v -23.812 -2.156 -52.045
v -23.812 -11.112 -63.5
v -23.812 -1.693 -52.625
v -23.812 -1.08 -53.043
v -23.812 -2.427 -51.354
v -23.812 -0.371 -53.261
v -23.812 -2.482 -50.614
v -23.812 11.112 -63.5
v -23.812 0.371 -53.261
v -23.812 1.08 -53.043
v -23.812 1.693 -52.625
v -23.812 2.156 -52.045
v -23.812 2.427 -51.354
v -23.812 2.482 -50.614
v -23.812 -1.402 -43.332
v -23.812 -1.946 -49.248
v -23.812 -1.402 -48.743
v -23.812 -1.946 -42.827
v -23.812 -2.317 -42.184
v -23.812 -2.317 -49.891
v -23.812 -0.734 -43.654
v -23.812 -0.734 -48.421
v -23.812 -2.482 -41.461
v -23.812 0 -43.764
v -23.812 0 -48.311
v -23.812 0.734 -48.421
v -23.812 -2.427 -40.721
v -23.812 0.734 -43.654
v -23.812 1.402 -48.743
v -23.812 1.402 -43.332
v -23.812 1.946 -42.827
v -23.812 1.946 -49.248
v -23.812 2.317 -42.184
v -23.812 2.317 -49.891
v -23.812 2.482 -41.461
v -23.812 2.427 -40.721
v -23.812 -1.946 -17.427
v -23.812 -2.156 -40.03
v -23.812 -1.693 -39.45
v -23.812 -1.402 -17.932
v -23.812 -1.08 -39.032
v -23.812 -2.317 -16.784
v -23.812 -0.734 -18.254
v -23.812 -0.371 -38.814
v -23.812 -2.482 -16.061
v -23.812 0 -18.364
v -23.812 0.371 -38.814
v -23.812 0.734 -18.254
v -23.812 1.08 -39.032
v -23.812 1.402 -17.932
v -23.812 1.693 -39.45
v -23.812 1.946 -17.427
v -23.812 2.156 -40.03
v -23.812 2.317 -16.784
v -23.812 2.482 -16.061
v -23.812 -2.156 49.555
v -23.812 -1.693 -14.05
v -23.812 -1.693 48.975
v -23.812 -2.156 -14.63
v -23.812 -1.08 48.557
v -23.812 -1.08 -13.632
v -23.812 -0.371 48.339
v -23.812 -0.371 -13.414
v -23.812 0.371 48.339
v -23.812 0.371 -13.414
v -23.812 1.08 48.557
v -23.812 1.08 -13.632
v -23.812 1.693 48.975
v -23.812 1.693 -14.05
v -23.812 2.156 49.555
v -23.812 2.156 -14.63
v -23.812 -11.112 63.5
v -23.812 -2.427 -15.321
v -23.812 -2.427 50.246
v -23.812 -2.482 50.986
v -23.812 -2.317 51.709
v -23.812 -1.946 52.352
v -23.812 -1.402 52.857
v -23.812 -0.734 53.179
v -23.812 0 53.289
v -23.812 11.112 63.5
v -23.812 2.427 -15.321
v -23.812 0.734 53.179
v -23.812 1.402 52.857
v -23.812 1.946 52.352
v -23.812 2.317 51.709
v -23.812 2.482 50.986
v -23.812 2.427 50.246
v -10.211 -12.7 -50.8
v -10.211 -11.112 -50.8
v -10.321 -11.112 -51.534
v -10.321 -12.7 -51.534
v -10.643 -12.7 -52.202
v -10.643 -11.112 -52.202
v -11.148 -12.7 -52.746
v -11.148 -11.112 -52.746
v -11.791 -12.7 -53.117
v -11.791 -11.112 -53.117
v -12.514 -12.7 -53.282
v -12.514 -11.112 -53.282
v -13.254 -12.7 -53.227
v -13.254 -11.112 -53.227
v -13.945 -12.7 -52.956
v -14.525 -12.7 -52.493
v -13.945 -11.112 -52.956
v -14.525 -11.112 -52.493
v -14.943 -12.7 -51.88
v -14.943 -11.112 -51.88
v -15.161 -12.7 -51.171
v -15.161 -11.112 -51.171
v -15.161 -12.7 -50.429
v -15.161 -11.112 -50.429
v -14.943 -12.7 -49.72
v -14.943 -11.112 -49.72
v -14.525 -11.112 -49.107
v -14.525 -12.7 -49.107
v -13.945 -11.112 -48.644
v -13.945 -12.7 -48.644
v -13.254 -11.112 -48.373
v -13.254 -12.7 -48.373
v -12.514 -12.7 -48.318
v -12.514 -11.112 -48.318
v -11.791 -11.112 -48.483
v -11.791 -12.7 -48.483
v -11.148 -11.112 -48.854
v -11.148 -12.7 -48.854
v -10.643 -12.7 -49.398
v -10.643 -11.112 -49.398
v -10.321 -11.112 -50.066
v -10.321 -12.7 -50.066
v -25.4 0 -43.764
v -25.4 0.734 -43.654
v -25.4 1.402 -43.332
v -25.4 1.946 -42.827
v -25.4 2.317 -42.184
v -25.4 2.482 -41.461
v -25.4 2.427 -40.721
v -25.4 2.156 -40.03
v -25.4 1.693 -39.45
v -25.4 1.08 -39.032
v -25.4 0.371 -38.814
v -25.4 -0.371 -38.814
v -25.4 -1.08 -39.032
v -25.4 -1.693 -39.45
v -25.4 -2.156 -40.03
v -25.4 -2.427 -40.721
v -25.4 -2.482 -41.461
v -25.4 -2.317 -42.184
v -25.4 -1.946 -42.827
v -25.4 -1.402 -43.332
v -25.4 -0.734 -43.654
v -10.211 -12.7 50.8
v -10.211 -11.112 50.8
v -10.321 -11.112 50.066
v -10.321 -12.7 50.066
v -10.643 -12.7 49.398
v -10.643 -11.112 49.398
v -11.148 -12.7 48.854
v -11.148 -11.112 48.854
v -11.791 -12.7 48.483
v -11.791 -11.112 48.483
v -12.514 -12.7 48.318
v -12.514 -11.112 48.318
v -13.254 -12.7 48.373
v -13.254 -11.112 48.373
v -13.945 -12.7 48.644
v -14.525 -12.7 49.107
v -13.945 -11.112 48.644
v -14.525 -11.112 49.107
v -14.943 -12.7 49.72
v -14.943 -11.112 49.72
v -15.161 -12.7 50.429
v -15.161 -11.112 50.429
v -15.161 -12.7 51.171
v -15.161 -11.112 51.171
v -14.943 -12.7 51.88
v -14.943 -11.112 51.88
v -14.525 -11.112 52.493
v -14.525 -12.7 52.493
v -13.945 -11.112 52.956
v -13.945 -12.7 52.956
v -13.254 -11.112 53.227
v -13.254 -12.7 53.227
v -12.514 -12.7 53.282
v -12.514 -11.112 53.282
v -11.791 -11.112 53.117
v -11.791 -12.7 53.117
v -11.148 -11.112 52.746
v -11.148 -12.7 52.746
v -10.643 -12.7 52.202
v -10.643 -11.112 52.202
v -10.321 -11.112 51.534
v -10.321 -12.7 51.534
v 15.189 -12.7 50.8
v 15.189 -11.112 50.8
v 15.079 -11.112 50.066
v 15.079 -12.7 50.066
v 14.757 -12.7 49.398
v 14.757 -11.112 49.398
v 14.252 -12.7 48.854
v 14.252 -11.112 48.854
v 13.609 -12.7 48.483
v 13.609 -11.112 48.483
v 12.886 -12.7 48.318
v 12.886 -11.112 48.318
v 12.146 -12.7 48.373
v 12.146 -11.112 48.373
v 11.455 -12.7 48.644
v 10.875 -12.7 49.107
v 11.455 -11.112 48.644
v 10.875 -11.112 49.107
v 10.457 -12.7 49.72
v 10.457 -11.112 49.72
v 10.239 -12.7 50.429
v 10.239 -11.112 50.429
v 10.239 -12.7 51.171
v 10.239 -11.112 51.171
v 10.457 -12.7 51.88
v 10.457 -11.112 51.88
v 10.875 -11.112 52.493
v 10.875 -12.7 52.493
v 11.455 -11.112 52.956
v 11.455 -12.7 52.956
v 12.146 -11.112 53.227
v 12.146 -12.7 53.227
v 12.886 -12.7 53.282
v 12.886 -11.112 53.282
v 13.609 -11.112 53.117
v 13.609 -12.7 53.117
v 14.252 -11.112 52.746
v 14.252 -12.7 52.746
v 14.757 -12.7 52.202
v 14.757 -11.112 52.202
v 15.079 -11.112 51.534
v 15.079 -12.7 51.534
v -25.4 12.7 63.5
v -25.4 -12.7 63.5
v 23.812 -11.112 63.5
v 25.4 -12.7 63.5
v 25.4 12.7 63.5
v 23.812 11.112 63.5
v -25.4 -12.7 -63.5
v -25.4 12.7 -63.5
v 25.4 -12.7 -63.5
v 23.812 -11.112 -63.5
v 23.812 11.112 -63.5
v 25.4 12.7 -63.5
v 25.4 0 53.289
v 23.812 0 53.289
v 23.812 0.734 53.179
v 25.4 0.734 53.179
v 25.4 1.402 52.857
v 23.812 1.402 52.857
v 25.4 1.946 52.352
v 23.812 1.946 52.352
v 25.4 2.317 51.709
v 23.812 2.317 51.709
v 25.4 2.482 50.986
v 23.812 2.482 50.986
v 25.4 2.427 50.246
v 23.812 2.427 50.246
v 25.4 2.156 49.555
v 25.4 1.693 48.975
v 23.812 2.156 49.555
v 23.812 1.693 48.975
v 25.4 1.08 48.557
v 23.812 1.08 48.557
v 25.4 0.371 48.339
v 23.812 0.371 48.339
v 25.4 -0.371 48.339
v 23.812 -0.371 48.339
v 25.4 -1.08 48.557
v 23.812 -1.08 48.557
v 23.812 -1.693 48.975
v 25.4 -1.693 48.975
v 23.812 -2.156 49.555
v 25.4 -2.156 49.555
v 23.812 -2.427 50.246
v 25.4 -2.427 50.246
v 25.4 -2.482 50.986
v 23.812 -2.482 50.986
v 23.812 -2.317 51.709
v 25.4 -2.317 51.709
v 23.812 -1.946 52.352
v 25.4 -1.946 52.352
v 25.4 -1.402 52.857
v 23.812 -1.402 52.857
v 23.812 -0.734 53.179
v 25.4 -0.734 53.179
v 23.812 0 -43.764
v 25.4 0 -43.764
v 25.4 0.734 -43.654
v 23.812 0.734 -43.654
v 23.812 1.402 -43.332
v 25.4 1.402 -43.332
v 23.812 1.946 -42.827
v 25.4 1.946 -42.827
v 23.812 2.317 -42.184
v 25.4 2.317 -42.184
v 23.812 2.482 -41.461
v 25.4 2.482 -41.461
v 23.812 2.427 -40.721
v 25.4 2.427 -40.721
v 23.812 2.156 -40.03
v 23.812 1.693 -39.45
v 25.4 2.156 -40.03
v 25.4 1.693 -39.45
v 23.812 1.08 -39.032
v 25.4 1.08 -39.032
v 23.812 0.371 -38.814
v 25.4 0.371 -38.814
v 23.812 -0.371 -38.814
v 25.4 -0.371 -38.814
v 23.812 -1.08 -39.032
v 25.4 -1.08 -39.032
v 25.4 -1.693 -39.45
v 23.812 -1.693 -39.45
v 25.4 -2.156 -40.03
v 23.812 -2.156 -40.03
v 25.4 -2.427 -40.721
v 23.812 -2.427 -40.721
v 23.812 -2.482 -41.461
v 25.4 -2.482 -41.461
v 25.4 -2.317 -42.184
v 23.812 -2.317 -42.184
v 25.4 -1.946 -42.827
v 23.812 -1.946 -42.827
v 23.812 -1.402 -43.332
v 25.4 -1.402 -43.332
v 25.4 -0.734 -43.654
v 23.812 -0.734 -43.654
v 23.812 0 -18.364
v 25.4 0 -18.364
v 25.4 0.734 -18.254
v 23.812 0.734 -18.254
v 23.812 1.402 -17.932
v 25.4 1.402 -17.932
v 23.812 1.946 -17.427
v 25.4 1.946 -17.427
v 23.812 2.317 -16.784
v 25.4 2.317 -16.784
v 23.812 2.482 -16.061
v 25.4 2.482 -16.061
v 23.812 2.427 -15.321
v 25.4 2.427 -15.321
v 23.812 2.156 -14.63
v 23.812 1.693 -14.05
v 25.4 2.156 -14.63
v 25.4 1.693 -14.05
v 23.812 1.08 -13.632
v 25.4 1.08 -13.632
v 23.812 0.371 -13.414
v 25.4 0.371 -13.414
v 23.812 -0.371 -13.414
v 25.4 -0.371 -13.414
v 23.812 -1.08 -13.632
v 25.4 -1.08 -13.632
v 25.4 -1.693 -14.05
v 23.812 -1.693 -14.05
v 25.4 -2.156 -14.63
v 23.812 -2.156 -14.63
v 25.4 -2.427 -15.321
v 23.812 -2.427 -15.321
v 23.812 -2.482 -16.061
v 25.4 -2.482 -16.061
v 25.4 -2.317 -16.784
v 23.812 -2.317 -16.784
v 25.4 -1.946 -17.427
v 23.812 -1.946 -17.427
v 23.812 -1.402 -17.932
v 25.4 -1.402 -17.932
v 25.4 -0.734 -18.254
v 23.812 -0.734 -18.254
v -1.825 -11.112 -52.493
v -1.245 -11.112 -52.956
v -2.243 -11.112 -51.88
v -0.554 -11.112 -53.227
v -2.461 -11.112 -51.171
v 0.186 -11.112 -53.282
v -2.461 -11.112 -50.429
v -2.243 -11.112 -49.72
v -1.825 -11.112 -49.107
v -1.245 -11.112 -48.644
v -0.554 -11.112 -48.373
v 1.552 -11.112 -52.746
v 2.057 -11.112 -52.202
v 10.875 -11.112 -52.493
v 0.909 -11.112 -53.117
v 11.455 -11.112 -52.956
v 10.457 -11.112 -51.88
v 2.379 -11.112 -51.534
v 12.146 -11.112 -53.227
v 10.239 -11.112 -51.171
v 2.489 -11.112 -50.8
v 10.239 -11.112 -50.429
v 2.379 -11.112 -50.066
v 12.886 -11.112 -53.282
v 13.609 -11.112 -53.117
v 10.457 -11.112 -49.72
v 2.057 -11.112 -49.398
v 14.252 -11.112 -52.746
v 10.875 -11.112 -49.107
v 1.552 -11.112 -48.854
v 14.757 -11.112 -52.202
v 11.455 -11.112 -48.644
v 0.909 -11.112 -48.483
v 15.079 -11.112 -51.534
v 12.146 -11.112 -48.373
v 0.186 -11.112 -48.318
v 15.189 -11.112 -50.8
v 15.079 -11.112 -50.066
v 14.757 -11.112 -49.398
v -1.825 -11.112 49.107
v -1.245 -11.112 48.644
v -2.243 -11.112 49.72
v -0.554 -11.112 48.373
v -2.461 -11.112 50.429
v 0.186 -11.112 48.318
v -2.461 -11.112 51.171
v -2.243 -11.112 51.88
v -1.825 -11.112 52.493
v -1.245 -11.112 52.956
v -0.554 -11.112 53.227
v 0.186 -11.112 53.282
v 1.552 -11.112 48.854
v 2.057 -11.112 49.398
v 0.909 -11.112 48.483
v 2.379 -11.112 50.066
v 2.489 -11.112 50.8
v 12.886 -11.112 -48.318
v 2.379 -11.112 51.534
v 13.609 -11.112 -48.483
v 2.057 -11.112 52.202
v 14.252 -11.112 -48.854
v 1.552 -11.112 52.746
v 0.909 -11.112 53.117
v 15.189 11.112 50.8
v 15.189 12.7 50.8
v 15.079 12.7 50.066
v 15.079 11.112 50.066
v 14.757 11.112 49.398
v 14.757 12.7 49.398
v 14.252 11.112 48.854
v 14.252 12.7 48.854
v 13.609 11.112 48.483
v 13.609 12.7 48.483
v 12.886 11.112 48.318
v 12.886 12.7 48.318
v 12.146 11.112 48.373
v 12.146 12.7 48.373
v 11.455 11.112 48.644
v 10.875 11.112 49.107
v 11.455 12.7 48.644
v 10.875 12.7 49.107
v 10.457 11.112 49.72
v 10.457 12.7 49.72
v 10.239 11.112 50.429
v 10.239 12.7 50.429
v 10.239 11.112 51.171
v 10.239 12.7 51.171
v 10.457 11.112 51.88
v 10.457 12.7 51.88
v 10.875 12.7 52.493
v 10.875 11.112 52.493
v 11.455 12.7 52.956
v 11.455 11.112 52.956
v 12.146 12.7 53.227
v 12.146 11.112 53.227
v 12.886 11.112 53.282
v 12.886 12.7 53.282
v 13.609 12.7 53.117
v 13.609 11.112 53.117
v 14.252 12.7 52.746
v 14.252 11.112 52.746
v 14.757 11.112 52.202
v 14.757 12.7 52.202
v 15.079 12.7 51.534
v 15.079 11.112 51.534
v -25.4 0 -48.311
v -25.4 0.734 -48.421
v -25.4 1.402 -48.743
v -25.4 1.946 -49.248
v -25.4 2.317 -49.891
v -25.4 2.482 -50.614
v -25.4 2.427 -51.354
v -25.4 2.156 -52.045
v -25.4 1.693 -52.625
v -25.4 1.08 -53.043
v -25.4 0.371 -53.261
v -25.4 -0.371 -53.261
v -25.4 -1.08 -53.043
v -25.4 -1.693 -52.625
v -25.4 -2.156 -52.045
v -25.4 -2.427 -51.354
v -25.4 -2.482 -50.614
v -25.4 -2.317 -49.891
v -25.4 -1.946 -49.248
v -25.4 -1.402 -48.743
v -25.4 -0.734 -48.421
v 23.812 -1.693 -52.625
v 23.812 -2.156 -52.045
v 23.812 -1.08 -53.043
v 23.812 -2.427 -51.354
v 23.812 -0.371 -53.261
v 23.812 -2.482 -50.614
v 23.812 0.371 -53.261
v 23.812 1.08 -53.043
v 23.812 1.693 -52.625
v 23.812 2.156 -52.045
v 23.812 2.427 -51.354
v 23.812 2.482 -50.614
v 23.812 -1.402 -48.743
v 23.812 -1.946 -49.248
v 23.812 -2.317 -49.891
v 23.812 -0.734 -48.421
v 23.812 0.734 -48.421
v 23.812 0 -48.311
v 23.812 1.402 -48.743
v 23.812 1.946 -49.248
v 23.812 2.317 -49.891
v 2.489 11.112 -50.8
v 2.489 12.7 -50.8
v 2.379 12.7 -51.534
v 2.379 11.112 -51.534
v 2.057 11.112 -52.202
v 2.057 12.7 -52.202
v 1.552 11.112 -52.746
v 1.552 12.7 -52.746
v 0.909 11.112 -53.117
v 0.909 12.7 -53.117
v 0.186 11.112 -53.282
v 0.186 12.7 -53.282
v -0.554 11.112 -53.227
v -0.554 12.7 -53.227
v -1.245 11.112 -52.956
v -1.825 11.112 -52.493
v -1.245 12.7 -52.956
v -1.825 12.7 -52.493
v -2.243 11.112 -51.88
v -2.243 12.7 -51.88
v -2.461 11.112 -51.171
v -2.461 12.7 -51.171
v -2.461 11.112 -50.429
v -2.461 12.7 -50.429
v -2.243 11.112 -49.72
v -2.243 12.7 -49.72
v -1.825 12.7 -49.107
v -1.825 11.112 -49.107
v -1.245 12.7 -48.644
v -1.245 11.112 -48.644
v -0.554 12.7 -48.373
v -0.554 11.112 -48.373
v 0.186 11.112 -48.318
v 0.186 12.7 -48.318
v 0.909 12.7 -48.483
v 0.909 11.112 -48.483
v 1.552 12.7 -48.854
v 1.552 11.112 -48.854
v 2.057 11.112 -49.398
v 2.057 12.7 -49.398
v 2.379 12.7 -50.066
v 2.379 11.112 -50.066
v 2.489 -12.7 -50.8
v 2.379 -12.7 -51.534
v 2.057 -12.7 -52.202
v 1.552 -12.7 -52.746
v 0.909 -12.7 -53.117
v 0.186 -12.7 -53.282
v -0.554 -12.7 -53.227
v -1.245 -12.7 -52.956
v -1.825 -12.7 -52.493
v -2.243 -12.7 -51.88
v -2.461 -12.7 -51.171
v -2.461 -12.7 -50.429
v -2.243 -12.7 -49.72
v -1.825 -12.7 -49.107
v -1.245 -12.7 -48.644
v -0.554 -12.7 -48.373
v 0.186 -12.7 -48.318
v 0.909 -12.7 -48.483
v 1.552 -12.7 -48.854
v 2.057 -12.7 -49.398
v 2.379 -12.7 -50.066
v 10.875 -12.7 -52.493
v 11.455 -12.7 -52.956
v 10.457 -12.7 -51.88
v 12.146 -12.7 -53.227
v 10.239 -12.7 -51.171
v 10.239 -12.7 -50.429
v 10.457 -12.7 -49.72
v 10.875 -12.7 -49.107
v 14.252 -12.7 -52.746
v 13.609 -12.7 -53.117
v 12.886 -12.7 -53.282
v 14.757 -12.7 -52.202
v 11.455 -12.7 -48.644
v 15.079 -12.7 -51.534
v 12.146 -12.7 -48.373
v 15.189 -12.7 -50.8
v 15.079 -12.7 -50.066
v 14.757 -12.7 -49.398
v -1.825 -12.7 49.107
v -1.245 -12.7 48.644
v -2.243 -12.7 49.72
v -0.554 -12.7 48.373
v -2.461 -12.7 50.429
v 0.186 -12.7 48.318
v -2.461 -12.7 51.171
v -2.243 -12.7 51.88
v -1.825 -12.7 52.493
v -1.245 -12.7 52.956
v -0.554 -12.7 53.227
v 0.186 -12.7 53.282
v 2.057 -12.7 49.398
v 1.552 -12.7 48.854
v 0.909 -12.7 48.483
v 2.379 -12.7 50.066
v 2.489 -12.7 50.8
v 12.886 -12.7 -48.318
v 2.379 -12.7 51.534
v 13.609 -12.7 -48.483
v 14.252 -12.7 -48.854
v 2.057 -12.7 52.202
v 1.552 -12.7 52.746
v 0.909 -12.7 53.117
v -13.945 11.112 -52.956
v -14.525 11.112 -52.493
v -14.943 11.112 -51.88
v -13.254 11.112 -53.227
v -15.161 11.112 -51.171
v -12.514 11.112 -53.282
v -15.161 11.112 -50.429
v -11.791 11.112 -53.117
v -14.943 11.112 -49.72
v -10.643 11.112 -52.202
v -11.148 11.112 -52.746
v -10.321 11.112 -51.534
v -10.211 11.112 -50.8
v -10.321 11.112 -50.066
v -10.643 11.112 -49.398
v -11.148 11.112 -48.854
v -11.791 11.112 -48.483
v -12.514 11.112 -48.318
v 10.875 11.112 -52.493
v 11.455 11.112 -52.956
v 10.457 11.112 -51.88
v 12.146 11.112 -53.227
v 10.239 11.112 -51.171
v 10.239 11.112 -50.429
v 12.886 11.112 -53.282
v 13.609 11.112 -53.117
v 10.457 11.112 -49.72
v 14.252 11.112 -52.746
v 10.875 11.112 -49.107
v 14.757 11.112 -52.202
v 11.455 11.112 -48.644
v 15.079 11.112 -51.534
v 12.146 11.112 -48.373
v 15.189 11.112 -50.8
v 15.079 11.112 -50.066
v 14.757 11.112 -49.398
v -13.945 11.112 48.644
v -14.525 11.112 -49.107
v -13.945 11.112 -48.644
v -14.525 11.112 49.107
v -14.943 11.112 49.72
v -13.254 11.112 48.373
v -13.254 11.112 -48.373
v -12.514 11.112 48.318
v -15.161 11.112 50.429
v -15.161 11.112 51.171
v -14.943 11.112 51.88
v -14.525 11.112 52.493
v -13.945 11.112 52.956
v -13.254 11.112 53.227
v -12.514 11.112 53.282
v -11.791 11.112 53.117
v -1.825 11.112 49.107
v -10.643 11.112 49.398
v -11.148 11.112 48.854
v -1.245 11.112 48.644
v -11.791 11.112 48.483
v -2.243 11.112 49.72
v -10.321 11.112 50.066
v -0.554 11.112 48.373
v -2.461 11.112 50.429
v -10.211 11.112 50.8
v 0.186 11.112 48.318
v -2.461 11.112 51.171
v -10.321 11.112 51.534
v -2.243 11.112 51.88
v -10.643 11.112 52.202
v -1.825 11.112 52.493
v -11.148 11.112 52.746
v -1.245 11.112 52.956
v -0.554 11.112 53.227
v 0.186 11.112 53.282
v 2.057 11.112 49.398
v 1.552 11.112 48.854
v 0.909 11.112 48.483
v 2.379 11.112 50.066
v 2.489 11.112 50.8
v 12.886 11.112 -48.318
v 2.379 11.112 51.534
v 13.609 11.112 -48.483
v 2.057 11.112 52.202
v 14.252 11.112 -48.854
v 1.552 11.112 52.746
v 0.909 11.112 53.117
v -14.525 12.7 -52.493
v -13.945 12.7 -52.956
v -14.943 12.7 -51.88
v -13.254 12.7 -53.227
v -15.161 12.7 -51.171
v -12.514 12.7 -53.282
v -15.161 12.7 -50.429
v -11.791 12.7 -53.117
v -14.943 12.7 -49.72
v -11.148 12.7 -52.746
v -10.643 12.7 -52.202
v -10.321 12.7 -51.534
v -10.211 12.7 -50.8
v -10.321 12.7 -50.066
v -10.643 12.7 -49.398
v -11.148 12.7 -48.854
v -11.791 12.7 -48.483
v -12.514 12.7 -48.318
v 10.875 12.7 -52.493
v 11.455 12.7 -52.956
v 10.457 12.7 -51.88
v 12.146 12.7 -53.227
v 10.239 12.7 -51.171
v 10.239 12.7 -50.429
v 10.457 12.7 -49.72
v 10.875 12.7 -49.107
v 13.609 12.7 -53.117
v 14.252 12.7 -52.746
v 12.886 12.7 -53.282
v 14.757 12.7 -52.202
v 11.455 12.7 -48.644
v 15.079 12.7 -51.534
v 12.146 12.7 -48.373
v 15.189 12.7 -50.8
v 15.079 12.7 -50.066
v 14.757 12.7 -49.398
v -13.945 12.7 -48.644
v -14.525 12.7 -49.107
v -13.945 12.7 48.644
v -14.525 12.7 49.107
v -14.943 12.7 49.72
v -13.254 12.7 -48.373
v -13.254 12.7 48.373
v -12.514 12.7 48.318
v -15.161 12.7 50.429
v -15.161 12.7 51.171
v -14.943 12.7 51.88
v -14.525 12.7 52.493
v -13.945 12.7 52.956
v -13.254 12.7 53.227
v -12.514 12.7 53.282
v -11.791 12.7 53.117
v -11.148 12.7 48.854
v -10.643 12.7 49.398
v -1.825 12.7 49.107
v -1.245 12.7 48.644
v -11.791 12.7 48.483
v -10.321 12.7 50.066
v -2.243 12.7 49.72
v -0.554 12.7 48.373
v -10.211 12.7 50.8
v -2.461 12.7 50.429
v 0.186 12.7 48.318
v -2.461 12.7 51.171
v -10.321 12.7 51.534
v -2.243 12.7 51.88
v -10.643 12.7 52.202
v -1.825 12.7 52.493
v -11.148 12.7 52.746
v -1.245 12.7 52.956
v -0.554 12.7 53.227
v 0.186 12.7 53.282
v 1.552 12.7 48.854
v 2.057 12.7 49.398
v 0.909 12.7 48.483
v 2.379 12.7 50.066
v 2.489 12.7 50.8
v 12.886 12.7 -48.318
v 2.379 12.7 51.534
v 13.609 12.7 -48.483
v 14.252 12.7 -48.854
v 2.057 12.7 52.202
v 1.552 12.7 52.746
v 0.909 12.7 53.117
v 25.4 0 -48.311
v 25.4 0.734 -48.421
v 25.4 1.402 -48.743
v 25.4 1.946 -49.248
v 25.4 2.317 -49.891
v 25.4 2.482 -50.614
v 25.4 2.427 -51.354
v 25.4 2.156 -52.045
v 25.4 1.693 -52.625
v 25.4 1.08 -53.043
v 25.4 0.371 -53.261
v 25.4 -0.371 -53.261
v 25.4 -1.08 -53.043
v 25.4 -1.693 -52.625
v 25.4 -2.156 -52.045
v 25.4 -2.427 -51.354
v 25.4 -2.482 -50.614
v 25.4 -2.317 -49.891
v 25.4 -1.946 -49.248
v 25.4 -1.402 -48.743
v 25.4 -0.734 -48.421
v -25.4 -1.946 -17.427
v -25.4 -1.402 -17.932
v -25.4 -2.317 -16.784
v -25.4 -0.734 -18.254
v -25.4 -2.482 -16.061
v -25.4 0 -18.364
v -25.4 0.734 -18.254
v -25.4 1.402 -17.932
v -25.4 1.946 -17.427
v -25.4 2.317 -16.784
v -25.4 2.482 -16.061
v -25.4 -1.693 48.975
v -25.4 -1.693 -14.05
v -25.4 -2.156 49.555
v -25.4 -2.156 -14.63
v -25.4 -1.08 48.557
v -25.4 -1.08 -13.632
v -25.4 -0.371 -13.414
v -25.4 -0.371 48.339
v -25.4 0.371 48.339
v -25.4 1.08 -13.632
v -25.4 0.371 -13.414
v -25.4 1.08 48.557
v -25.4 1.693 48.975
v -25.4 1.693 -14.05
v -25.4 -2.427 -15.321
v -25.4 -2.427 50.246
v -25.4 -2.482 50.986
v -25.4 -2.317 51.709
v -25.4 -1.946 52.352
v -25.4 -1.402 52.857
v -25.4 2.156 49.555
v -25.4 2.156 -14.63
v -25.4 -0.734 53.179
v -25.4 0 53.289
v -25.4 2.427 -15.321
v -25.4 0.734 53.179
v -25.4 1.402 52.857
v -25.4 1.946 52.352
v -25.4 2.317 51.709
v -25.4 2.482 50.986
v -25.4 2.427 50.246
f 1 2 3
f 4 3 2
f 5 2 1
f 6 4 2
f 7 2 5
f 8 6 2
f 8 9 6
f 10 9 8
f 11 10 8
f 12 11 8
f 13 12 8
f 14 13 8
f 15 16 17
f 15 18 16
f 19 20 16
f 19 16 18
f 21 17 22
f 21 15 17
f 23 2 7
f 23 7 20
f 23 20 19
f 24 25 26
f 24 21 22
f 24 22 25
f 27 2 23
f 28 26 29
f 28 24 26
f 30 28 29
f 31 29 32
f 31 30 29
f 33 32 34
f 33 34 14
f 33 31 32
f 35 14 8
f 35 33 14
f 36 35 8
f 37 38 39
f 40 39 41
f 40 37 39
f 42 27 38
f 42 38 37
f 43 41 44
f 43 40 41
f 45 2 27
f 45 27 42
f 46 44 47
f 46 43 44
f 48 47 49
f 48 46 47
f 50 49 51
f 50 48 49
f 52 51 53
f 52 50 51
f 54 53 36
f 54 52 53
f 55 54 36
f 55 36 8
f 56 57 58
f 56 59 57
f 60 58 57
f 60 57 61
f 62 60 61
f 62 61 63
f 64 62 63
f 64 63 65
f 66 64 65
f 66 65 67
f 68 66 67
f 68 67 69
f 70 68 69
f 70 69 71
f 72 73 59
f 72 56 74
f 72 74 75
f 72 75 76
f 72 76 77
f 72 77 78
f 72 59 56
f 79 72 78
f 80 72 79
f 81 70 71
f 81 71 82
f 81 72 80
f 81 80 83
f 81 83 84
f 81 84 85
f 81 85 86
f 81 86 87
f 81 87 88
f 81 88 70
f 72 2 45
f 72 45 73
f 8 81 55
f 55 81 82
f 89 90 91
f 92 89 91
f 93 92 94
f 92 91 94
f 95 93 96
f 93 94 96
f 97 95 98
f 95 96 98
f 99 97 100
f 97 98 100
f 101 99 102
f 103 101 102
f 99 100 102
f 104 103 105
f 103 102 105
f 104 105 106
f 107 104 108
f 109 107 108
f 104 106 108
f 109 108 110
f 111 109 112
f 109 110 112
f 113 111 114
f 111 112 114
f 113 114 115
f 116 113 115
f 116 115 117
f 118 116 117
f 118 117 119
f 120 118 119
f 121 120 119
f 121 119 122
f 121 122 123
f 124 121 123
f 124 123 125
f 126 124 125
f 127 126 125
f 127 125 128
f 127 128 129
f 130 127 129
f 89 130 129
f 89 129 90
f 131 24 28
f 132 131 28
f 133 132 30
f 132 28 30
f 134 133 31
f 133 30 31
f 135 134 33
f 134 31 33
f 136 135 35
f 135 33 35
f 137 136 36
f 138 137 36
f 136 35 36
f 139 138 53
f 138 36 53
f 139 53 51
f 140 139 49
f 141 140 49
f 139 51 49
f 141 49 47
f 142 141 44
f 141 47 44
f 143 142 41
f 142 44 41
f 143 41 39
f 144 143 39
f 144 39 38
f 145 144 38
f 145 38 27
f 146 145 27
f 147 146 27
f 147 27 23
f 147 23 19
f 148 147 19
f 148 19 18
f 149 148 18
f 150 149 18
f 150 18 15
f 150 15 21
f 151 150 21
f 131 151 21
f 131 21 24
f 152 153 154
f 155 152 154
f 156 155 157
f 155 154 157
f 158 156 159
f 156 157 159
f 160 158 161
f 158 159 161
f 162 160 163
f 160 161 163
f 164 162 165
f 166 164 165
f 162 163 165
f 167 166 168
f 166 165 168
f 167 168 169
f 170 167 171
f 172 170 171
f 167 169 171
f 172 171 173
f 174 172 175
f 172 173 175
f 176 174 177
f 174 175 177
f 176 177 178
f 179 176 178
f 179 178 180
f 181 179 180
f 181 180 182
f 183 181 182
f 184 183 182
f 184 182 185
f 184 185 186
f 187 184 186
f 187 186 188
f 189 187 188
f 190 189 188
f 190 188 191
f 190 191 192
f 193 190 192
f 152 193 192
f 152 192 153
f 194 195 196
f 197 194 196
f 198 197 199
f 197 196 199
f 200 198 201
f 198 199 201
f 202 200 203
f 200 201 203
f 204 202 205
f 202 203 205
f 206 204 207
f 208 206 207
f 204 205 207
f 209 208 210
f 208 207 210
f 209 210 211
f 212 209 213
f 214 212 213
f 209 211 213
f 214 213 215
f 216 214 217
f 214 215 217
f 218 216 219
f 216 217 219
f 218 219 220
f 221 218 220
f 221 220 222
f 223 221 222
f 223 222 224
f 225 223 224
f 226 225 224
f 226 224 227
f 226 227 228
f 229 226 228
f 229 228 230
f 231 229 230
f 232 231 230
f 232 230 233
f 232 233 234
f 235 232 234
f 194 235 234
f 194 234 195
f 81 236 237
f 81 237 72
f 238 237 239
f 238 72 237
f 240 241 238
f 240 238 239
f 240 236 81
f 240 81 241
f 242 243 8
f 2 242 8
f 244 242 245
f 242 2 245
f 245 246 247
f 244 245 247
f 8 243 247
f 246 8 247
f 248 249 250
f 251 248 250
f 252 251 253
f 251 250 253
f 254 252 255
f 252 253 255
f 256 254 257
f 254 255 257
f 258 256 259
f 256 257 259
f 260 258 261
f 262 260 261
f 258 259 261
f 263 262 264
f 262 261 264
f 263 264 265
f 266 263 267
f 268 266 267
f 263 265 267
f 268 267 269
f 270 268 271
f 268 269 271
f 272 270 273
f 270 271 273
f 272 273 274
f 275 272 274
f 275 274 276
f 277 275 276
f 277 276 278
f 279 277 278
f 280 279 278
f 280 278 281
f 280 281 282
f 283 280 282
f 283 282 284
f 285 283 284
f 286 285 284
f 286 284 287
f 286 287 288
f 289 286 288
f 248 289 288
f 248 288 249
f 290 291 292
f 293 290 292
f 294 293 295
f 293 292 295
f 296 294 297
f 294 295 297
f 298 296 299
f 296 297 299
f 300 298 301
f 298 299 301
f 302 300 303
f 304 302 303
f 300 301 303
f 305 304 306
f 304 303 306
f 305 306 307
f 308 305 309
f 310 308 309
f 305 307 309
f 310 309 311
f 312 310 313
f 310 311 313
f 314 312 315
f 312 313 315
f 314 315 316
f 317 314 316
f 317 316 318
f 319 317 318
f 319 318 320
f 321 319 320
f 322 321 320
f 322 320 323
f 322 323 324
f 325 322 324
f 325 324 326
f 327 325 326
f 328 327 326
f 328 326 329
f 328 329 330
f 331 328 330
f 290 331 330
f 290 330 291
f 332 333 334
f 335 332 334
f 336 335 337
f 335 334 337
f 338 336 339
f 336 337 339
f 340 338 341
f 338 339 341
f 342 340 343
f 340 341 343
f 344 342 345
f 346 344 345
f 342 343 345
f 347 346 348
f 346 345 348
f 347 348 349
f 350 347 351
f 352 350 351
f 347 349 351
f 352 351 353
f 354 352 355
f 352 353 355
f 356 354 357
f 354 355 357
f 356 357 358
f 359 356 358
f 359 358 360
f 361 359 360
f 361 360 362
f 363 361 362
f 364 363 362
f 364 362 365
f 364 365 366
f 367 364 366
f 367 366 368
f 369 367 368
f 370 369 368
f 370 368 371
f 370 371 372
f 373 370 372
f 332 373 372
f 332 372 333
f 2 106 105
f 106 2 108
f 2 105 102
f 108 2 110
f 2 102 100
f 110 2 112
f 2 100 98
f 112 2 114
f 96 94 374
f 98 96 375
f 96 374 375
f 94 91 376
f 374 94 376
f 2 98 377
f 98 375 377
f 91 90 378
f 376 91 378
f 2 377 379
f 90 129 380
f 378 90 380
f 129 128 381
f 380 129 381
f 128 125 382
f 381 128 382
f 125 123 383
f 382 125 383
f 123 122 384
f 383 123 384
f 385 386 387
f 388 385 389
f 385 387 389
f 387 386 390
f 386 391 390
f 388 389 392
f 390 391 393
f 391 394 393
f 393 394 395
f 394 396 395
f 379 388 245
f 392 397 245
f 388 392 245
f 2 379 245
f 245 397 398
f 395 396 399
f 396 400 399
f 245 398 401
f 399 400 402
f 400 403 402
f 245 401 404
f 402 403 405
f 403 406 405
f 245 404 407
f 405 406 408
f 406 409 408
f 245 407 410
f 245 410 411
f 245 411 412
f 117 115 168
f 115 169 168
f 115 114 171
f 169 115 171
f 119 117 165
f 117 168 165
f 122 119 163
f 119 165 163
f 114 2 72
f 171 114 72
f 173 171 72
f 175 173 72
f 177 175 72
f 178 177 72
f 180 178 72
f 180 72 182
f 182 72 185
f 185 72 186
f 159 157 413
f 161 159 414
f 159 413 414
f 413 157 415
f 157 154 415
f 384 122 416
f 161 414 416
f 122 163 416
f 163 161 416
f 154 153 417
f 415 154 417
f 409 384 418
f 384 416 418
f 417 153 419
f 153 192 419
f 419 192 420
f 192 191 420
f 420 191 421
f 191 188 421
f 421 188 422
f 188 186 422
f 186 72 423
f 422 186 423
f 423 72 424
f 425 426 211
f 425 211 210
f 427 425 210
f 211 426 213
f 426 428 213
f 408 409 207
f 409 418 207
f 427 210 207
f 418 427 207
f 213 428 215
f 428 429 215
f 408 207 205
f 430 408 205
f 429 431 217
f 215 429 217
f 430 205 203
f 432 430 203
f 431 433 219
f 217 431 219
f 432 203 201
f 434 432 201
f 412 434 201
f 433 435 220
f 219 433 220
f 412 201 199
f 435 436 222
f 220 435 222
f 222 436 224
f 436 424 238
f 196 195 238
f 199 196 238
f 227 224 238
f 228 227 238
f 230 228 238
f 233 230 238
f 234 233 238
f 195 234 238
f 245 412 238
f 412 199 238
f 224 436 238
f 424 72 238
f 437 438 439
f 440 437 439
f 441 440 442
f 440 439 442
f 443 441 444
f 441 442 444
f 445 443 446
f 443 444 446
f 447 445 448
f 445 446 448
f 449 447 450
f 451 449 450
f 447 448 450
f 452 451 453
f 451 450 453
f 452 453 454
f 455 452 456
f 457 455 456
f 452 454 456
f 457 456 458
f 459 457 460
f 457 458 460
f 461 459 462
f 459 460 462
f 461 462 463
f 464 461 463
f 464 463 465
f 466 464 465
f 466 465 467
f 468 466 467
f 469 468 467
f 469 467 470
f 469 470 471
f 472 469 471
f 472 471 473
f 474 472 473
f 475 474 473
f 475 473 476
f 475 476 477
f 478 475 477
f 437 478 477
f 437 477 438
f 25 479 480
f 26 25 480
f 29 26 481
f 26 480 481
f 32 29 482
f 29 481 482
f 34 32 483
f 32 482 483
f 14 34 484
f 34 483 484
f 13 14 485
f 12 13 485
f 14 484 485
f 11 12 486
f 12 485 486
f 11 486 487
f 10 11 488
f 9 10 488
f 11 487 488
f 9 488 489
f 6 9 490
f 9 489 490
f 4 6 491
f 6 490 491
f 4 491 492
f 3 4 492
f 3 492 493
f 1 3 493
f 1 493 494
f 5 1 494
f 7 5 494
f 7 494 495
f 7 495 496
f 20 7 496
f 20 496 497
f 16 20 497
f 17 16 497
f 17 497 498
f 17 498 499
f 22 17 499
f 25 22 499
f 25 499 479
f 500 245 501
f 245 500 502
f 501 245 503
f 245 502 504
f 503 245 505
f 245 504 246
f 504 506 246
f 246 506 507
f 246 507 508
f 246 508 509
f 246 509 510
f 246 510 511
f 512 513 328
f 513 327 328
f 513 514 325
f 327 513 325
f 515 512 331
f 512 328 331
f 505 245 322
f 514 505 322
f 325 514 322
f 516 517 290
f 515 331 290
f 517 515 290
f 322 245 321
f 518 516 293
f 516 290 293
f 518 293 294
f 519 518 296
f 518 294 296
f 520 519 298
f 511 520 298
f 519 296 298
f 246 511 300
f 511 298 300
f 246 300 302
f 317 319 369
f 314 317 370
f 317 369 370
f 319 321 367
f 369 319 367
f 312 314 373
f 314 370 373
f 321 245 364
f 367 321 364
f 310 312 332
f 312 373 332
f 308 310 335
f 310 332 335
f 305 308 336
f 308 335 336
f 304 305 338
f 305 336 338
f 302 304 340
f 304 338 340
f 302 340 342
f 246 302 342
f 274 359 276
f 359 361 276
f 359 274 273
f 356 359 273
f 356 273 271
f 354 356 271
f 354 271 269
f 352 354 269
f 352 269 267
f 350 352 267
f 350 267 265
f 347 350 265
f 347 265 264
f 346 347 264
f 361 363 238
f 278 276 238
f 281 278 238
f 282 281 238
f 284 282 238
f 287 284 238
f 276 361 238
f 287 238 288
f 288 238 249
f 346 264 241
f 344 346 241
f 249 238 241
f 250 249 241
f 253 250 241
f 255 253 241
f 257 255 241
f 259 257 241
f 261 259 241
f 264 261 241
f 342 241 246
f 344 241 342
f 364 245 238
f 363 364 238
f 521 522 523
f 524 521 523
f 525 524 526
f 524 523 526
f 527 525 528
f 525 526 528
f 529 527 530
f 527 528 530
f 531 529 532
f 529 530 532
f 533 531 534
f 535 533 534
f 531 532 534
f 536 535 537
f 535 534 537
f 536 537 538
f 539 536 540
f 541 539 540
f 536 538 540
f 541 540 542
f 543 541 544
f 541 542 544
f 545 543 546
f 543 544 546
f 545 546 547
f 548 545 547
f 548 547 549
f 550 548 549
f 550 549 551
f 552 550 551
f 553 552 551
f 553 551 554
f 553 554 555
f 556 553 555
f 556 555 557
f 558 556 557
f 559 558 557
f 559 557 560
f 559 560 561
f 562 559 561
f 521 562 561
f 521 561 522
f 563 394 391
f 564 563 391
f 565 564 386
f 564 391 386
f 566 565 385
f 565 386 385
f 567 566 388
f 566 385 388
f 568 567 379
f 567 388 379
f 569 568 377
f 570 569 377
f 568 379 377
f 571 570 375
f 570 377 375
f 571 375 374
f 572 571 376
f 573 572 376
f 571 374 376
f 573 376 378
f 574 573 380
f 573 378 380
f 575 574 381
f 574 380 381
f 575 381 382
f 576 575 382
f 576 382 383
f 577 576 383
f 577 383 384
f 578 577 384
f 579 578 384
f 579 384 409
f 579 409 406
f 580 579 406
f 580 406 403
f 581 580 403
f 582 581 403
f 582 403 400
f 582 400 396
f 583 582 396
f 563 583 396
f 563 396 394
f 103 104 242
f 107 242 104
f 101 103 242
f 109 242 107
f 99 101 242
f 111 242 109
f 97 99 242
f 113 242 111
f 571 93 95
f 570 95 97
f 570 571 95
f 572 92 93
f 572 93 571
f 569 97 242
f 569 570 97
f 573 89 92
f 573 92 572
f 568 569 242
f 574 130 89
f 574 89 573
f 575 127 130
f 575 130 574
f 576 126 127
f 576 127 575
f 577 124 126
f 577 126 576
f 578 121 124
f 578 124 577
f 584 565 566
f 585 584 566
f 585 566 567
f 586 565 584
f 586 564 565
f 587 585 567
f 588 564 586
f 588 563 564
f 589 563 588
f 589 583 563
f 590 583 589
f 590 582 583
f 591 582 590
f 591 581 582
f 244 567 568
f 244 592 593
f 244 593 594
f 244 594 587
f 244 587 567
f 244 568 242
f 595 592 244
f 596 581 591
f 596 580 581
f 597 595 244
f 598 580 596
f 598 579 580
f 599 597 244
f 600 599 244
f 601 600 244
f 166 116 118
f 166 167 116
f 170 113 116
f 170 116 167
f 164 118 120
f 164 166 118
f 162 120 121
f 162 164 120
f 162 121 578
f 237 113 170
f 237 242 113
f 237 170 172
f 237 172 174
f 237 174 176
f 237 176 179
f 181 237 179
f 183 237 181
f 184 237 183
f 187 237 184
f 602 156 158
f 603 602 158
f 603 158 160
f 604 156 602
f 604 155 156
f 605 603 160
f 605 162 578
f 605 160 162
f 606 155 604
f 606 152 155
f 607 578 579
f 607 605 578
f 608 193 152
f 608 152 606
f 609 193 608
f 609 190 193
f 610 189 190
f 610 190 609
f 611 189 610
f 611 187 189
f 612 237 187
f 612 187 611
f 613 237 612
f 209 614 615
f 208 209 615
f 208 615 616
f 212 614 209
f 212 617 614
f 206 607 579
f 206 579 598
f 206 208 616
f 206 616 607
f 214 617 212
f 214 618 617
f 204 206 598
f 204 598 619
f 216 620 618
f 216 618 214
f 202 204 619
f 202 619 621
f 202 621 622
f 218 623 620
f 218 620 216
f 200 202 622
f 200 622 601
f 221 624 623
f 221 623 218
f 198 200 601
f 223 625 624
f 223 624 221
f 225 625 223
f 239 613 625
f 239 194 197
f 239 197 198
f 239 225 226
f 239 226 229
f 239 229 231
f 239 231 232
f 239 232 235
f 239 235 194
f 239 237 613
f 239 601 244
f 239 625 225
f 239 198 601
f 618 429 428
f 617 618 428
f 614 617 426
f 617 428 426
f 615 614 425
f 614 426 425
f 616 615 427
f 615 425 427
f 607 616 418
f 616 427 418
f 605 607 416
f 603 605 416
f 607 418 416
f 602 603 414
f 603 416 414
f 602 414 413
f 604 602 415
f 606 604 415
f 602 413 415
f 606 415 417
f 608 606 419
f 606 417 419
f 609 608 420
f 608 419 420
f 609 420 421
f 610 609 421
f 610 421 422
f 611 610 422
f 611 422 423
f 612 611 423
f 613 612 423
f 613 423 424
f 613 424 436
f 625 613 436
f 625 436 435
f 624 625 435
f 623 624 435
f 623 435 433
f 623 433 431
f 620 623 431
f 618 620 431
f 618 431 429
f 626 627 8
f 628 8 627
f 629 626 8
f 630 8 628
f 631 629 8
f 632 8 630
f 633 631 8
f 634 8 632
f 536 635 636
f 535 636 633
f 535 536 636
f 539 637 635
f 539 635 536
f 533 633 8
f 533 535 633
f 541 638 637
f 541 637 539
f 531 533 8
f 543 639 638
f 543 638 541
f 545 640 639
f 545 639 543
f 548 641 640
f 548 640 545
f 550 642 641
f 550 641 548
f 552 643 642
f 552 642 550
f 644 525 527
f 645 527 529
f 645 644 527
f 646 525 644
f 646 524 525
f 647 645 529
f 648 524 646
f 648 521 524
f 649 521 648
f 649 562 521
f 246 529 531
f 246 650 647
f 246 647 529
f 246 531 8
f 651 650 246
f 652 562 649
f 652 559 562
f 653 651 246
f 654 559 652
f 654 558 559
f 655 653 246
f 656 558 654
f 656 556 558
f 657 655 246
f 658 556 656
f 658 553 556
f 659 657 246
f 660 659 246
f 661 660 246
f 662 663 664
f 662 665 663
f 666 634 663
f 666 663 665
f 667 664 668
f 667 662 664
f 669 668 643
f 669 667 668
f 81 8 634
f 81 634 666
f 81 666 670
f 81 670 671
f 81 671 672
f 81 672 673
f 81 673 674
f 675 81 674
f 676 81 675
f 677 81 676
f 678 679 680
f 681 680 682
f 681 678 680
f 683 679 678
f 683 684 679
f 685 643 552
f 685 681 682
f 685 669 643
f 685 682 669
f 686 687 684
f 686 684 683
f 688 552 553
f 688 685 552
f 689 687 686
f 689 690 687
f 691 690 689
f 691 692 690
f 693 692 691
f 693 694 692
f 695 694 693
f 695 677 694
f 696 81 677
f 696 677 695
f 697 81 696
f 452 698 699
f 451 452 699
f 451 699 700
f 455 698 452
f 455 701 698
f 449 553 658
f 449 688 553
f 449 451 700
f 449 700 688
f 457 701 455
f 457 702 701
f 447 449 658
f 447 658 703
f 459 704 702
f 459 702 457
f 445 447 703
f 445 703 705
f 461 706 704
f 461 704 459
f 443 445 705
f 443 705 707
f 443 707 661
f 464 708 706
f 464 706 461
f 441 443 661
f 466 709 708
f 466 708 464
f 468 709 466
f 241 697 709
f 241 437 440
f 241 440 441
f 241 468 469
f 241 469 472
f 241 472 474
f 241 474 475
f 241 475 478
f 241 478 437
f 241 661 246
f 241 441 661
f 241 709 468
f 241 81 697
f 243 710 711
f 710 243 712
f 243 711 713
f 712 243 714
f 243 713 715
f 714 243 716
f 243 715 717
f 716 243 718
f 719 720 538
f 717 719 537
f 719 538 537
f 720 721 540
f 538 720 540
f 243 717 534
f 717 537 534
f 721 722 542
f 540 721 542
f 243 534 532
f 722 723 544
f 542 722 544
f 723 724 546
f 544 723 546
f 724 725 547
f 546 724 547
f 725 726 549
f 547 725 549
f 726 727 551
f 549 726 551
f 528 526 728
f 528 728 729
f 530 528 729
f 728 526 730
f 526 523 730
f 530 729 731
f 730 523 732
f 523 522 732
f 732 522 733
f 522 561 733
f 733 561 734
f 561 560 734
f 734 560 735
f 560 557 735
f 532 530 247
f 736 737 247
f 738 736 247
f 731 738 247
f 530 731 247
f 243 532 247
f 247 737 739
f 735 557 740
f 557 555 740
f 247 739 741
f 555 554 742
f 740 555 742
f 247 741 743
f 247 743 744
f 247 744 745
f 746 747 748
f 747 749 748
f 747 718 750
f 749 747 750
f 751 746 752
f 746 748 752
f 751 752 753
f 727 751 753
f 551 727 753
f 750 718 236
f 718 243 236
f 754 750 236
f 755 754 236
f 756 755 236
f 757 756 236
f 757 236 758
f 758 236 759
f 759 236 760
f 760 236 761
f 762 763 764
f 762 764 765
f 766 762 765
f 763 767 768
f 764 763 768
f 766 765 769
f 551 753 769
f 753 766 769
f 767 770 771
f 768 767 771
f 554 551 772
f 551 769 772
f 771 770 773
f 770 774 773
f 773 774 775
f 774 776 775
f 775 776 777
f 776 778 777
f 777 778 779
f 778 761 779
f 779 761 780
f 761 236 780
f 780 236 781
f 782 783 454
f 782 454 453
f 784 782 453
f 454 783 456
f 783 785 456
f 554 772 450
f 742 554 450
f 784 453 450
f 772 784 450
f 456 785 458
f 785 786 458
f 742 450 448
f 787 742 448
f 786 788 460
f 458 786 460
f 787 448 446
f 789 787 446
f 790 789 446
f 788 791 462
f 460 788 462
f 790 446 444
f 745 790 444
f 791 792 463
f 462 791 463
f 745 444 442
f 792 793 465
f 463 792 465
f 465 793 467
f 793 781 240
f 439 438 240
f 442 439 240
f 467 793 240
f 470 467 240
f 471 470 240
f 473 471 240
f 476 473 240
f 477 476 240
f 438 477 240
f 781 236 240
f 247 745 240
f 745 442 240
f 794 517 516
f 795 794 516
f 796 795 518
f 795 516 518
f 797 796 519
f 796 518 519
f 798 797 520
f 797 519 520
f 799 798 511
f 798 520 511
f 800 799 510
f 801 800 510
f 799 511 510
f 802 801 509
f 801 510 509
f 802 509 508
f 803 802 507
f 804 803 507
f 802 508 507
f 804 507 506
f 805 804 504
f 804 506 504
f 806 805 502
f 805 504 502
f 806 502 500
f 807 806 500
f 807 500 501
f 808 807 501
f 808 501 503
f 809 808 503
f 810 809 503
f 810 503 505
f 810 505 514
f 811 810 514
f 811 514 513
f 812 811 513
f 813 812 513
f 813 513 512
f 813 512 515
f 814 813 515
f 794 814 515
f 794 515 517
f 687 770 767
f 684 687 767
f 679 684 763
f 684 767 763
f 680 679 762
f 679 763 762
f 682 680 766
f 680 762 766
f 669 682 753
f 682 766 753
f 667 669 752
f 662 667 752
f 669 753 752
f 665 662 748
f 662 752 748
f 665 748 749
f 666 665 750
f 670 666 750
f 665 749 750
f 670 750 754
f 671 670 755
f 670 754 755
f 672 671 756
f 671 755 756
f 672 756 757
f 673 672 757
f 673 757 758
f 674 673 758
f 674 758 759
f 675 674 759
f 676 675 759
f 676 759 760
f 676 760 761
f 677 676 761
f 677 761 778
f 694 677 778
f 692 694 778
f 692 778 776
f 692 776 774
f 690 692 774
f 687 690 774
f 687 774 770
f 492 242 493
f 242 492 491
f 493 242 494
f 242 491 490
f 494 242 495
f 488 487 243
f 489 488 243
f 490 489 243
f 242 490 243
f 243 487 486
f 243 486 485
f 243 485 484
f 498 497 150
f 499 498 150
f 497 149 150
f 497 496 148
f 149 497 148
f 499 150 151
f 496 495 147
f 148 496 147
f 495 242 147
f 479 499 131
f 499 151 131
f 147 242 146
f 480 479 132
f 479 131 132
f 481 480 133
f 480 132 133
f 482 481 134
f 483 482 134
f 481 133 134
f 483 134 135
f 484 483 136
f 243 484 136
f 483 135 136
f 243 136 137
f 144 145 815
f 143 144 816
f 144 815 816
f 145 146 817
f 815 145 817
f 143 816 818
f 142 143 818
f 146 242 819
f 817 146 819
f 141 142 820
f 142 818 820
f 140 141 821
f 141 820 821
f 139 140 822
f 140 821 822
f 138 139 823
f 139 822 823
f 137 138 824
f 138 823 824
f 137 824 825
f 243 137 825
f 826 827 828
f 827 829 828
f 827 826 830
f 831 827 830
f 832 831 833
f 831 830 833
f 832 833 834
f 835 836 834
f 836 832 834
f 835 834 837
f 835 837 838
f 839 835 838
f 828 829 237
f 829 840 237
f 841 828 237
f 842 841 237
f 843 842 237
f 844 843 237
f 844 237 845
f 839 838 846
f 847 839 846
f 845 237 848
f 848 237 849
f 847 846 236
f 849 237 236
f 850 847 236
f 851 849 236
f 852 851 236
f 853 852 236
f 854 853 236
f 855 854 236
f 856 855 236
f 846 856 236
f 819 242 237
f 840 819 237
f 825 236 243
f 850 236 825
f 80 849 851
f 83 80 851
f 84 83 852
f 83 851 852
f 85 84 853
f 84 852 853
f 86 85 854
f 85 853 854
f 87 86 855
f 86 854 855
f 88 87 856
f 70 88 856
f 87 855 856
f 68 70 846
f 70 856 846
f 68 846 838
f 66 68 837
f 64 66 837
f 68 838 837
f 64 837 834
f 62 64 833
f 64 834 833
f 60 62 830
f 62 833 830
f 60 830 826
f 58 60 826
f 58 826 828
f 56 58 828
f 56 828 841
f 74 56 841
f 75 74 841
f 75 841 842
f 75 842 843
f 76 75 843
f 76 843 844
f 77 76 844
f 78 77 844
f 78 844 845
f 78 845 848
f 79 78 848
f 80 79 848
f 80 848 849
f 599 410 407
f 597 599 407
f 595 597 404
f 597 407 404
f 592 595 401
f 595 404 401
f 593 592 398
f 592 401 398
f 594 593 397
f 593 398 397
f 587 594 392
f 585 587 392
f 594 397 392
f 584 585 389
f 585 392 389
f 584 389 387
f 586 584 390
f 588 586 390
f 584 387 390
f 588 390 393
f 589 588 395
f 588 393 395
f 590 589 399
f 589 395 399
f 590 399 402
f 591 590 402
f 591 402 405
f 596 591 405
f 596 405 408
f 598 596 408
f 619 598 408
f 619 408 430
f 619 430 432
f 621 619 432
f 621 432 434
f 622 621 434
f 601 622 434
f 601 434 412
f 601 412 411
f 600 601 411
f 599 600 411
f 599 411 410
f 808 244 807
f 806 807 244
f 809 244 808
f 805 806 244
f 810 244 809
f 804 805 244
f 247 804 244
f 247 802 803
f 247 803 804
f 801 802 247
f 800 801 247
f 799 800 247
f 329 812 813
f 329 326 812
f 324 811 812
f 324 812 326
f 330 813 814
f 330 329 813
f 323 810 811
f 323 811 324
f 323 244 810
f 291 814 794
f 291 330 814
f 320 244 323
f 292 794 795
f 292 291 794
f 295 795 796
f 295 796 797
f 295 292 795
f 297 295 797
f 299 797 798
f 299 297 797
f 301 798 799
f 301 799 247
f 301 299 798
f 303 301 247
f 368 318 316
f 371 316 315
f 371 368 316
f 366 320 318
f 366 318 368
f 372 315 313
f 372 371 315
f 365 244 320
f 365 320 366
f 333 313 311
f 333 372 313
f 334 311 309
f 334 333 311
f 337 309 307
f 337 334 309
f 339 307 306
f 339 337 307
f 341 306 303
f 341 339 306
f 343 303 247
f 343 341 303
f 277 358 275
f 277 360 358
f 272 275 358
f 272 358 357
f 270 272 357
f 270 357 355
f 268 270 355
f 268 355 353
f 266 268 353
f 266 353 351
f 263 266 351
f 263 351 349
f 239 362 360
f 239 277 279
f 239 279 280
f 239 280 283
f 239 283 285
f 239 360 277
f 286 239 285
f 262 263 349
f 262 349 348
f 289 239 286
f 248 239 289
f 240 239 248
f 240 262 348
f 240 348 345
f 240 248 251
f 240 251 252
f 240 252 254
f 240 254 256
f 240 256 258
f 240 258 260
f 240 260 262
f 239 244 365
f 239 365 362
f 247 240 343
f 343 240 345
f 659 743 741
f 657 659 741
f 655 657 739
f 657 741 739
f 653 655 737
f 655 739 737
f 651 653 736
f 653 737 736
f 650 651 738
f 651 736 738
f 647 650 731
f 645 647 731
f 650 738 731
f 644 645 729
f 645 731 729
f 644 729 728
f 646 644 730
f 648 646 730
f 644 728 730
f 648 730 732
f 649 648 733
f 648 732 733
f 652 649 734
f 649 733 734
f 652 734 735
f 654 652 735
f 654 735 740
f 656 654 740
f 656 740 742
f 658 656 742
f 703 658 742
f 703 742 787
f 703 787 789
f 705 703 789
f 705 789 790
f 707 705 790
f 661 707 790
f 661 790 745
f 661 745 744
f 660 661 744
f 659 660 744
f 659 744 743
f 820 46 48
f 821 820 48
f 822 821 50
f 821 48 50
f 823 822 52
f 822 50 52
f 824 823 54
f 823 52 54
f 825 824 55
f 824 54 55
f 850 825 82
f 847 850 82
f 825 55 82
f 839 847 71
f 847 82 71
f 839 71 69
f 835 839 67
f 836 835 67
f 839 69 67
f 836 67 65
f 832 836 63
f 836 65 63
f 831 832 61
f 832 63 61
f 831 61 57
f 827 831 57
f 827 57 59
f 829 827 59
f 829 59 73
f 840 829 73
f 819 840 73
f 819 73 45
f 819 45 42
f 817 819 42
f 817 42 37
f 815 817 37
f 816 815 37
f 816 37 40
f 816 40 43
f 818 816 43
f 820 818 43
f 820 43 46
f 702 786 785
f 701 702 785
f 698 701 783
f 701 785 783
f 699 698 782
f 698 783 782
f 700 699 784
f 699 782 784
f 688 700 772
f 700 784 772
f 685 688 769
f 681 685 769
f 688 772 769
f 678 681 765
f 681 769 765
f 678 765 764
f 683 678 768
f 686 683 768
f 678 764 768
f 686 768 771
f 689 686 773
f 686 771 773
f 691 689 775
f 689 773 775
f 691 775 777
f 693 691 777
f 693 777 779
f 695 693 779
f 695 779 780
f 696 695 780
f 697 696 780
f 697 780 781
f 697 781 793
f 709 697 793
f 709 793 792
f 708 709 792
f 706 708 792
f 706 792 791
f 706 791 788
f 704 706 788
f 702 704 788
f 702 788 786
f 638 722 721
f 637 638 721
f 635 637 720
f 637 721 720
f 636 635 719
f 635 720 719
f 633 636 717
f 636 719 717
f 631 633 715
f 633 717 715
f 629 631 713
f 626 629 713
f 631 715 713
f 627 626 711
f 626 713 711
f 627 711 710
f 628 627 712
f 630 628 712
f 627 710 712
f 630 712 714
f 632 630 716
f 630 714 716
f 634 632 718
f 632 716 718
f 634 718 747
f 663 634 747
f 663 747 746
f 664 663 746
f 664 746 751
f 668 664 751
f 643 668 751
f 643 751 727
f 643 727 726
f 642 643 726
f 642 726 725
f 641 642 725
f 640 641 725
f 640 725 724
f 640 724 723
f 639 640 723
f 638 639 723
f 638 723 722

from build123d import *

# Parameters (mm, degrees)
SKETCH1_W           = 50.8
SKETCH1_H           = 25.4
SKETCH1_W_2         = 47.625
SKETCH1_H_2         = 22.225
BOSS_EXTRUDE1_DEPTH = 63.5
SKETCH2_R           = 2.4892
CUT_EXTRUDE1_DEPTH  = 26.4
SKETCH3_R           = 2.4892
CUT_EXTRUDE2_DEPTH  = 51.8
SKETCH5_R           = 2.4892
CUT_EXTRUDE3_DEPTH  = 51.8


with BuildPart() as part:
    # Sketch1 → Boss-Extrude1 (new body, symmetric)
    with BuildSketch(Plane.XY):
        Rectangle(SKETCH1_W, SKETCH1_H)
        Rectangle(SKETCH1_W_2, SKETCH1_H_2, mode=Mode.SUBTRACT)
    extrude(amount=BOSS_EXTRUDE1_DEPTH, both=True)

    # Sketch2 → Cut-Extrude1 (cut, through all)
    with BuildSketch(Plane(origin=(0, 12.7, 0), x_dir=(1, 0, 0), z_dir=(0, 1, 0))):
        with Locations((-12.7, 50.8)):
            Circle(SKETCH2_R)
        with Locations((0, 50.8)):
            Circle(SKETCH2_R)
        with Locations((12.7, 50.8)):
            Circle(SKETCH2_R)
        with Locations((12.7, -50.8)):
            Circle(SKETCH2_R)
        with Locations((0, -50.8)):
            Circle(SKETCH2_R)
        with Locations((-12.7, -50.8)):
            Circle(SKETCH2_R)
    extrude(amount=-CUT_EXTRUDE1_DEPTH, mode=Mode.SUBTRACT)

    # Sketch3 → Cut-Extrude2 (cut, through all)
    with BuildSketch(Plane.ZY.offset(25.4)):
        with Locations((-50.8, 0)):
            Circle(SKETCH3_R)
        with Locations((50.8, 0)):
            Circle(SKETCH3_R)
    extrude(amount=-CUT_EXTRUDE2_DEPTH, mode=Mode.SUBTRACT)

    # Sketch5 → Cut-Extrude3 (cut, through all)
    with BuildSketch(Plane(origin=(25.4, 0, 0), x_dir=(0, 0, -1), z_dir=(1, 0, 0))):
        with Locations((41.275, 0)):
            Circle(SKETCH5_R)
        with Locations((15.875, 0)):
            Circle(SKETCH5_R)
    extrude(amount=-CUT_EXTRUDE3_DEPTH, mode=Mode.SUBTRACT)


solid = part.part
